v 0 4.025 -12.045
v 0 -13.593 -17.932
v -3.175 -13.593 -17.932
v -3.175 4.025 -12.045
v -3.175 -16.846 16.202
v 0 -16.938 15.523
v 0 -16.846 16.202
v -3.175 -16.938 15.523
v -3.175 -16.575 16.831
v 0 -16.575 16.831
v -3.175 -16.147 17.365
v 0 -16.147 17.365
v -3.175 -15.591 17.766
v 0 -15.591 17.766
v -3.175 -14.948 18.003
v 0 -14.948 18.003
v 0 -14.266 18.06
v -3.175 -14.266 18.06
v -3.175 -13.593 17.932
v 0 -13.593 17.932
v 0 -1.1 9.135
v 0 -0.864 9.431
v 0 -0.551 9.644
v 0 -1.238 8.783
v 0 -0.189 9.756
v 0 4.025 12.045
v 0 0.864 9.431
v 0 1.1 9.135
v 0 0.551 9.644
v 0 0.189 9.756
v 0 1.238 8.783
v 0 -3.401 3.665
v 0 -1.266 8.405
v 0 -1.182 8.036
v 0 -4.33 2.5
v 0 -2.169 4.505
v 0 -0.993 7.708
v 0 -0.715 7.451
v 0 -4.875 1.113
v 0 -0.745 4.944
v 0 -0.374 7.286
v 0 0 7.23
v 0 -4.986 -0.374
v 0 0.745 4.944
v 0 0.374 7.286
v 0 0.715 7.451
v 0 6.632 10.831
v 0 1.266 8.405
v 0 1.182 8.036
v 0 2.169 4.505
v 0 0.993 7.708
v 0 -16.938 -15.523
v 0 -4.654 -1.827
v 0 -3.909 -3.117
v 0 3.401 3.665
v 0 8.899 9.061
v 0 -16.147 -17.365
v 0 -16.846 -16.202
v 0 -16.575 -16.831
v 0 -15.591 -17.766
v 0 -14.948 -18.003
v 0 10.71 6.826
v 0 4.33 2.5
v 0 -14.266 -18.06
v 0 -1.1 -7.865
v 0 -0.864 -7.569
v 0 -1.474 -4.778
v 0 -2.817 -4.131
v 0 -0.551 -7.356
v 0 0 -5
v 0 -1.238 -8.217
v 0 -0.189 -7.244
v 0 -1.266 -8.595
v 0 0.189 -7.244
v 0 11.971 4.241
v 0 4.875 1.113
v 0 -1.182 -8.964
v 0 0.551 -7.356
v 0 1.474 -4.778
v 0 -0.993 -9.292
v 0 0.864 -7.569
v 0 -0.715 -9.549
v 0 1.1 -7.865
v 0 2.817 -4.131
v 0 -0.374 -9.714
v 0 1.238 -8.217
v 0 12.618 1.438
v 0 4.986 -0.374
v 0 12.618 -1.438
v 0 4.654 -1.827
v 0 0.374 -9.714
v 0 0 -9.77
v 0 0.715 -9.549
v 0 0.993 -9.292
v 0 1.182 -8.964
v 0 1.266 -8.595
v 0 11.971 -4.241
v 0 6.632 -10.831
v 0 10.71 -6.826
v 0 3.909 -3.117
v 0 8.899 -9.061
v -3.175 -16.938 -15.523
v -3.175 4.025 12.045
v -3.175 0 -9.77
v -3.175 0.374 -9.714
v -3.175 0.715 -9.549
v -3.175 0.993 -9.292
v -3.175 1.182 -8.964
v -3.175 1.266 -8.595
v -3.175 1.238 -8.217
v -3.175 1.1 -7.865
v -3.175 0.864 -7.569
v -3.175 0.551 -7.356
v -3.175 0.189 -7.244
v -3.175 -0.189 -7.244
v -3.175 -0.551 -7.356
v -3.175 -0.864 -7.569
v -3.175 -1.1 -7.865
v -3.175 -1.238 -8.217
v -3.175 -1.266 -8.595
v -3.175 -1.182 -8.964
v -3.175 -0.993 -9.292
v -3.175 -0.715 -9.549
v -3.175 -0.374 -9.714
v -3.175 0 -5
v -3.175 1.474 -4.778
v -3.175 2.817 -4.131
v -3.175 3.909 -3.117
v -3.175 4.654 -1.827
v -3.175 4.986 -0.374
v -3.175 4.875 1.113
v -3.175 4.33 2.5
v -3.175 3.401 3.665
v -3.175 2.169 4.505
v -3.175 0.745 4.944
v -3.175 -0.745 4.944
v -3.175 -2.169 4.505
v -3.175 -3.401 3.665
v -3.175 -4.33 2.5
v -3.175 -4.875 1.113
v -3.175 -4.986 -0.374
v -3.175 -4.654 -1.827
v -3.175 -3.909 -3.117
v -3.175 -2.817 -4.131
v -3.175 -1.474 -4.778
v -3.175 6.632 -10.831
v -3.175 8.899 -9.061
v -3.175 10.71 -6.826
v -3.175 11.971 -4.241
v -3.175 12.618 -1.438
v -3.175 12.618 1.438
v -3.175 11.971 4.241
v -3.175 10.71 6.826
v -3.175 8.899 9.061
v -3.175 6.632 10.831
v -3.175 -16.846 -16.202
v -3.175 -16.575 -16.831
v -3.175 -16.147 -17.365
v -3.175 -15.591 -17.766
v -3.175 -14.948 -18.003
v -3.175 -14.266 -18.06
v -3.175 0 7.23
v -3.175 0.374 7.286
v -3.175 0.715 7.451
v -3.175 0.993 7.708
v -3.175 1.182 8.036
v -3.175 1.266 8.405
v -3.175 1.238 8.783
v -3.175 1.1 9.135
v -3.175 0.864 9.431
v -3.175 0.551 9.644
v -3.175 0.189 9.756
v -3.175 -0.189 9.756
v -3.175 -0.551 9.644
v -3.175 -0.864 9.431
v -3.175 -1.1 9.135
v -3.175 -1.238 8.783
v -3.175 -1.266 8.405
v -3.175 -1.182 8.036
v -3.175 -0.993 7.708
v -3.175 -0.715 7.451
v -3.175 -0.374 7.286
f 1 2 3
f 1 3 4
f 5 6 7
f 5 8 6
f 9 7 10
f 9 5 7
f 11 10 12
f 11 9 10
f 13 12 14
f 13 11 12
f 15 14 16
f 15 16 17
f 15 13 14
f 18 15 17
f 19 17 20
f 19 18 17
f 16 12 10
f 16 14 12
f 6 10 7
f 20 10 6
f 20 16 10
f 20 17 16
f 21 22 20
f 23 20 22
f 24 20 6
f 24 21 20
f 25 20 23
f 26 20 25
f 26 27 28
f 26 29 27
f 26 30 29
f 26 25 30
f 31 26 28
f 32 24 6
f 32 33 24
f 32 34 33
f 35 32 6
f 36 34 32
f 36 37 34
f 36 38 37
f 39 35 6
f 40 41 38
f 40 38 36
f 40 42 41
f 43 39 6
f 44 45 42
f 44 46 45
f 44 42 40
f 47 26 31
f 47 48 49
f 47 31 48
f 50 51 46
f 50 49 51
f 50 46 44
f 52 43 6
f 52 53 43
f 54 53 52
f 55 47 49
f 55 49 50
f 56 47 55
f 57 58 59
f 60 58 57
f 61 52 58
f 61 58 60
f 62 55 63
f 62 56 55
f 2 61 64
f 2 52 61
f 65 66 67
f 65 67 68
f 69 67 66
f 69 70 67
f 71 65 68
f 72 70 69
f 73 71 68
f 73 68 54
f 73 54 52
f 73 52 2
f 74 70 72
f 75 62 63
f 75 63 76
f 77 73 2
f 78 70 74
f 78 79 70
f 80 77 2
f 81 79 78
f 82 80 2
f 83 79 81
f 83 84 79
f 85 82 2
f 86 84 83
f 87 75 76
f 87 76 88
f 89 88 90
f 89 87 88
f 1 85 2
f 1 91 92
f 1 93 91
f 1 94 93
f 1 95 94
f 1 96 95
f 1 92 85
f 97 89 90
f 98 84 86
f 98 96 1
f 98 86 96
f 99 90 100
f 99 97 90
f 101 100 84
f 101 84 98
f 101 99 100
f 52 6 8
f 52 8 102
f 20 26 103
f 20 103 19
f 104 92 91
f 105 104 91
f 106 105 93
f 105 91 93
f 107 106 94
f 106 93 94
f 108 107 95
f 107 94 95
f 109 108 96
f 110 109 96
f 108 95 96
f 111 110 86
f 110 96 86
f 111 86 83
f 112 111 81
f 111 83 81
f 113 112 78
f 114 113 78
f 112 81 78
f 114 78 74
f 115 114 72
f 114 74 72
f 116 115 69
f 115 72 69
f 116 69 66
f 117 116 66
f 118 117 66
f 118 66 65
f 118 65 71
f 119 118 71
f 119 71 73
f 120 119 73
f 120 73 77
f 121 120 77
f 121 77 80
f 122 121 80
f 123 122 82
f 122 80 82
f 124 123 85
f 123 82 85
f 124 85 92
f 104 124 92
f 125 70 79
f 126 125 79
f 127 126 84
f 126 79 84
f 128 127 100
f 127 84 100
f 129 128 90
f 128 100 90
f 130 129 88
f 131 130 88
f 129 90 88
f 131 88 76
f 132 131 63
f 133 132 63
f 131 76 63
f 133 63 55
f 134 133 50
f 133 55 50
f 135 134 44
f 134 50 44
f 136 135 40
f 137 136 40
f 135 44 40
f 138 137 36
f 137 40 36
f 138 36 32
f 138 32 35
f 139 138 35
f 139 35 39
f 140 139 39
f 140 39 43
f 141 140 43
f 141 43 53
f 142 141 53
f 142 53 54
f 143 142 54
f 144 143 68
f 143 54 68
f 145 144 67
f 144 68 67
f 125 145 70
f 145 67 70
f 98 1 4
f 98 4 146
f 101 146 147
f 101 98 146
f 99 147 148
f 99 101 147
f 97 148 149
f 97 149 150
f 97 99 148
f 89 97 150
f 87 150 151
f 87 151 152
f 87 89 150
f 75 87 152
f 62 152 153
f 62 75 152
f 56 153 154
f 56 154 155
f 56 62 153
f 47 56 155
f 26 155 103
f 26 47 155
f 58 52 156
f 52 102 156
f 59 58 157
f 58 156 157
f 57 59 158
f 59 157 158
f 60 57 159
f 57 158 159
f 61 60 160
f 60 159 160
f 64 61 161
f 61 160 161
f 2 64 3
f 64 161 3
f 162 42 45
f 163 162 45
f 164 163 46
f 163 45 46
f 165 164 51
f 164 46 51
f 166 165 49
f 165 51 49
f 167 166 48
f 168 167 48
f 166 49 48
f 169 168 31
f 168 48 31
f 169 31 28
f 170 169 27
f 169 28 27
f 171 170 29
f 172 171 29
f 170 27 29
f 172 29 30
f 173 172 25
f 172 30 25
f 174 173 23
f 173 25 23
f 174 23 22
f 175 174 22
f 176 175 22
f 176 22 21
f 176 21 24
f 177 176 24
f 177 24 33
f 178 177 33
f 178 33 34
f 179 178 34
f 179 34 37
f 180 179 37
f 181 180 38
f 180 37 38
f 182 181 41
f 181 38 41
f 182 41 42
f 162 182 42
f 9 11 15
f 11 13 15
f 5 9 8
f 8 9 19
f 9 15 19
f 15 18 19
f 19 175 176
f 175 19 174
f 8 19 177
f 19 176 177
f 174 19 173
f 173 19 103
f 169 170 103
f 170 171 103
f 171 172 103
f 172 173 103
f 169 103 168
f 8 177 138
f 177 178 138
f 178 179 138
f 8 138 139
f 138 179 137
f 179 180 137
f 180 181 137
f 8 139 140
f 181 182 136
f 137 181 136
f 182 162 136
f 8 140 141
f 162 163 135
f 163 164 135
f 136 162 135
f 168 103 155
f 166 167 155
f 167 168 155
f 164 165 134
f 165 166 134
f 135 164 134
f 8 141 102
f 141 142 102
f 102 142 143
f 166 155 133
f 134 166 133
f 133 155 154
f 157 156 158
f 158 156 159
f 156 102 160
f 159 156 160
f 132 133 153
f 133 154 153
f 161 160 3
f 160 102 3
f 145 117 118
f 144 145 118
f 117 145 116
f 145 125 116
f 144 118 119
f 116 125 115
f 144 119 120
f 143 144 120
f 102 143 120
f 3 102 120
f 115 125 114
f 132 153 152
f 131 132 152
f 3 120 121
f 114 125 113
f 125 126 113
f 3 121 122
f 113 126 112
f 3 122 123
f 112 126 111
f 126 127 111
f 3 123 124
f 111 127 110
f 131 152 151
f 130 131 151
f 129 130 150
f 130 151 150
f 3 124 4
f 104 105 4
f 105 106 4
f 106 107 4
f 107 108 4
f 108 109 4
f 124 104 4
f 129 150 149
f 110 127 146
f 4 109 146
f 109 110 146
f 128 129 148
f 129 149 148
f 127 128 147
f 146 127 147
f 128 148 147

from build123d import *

# Parameters (mm, degrees)
SKETCH1_R           = 12.7
SKETCH1_R_2         = 5
SKETCH1_R_3         = 1.27
BOSS_EXTRUDE1_DEPTH = 3.175
FILLET1_R           = 2.54
FILLET2_R           = 2.54


with BuildPart() as part:
    # Sketch1 → Boss-Extrude1 (new body)
    with BuildSketch(Plane(origin=(0, 0, 0), x_dir=(0, 0, -1), z_dir=(1, 0, 0))):
        with BuildLine():
            Line((-19.05, -16.938), (0, -16.938))
            Line((0, -16.938), (19.05, -16.938))
            Line((19.05, -16.938), (12.045339341, 4.024897535))
            ThreePointArc((12.045339341, 4.024897535), (12.535266444, 2.03889558), (12.7, 0))
            ThreePointArc((12.7, 0), (-2.03889558, -12.535266444), (-12.045339341, 4.024897535))
            Line((-12.045339341, 4.024897535), (-19.05, -16.938))
        make_face()
        Circle(SKETCH1_R)
        Circle(SKETCH1_R_2, mode=Mode.SUBTRACT)
        with Locations((-8.5, 0)):
            Circle(SKETCH1_R_3, mode=Mode.SUBTRACT)
        with Locations((8.5, 0)):
            Circle(SKETCH1_R_3, mode=Mode.SUBTRACT)
    extrude(amount=-BOSS_EXTRUDE1_DEPTH)

    # Fillet1
    fillet1_edges = [part.edges().sort_by_distance(p)[0] for p in [
        (-1.5875, -16.938, -19.05),
    ]]
    fillet(fillet1_edges, radius=FILLET1_R)

    # Fillet2
    fillet2_edges = [part.edges().sort_by_distance(p)[0] for p in [
        (-1.5875, -16.938, 19.05),
    ]]
    fillet(fillet2_edges, radius=FILLET2_R)


solid = part.part
